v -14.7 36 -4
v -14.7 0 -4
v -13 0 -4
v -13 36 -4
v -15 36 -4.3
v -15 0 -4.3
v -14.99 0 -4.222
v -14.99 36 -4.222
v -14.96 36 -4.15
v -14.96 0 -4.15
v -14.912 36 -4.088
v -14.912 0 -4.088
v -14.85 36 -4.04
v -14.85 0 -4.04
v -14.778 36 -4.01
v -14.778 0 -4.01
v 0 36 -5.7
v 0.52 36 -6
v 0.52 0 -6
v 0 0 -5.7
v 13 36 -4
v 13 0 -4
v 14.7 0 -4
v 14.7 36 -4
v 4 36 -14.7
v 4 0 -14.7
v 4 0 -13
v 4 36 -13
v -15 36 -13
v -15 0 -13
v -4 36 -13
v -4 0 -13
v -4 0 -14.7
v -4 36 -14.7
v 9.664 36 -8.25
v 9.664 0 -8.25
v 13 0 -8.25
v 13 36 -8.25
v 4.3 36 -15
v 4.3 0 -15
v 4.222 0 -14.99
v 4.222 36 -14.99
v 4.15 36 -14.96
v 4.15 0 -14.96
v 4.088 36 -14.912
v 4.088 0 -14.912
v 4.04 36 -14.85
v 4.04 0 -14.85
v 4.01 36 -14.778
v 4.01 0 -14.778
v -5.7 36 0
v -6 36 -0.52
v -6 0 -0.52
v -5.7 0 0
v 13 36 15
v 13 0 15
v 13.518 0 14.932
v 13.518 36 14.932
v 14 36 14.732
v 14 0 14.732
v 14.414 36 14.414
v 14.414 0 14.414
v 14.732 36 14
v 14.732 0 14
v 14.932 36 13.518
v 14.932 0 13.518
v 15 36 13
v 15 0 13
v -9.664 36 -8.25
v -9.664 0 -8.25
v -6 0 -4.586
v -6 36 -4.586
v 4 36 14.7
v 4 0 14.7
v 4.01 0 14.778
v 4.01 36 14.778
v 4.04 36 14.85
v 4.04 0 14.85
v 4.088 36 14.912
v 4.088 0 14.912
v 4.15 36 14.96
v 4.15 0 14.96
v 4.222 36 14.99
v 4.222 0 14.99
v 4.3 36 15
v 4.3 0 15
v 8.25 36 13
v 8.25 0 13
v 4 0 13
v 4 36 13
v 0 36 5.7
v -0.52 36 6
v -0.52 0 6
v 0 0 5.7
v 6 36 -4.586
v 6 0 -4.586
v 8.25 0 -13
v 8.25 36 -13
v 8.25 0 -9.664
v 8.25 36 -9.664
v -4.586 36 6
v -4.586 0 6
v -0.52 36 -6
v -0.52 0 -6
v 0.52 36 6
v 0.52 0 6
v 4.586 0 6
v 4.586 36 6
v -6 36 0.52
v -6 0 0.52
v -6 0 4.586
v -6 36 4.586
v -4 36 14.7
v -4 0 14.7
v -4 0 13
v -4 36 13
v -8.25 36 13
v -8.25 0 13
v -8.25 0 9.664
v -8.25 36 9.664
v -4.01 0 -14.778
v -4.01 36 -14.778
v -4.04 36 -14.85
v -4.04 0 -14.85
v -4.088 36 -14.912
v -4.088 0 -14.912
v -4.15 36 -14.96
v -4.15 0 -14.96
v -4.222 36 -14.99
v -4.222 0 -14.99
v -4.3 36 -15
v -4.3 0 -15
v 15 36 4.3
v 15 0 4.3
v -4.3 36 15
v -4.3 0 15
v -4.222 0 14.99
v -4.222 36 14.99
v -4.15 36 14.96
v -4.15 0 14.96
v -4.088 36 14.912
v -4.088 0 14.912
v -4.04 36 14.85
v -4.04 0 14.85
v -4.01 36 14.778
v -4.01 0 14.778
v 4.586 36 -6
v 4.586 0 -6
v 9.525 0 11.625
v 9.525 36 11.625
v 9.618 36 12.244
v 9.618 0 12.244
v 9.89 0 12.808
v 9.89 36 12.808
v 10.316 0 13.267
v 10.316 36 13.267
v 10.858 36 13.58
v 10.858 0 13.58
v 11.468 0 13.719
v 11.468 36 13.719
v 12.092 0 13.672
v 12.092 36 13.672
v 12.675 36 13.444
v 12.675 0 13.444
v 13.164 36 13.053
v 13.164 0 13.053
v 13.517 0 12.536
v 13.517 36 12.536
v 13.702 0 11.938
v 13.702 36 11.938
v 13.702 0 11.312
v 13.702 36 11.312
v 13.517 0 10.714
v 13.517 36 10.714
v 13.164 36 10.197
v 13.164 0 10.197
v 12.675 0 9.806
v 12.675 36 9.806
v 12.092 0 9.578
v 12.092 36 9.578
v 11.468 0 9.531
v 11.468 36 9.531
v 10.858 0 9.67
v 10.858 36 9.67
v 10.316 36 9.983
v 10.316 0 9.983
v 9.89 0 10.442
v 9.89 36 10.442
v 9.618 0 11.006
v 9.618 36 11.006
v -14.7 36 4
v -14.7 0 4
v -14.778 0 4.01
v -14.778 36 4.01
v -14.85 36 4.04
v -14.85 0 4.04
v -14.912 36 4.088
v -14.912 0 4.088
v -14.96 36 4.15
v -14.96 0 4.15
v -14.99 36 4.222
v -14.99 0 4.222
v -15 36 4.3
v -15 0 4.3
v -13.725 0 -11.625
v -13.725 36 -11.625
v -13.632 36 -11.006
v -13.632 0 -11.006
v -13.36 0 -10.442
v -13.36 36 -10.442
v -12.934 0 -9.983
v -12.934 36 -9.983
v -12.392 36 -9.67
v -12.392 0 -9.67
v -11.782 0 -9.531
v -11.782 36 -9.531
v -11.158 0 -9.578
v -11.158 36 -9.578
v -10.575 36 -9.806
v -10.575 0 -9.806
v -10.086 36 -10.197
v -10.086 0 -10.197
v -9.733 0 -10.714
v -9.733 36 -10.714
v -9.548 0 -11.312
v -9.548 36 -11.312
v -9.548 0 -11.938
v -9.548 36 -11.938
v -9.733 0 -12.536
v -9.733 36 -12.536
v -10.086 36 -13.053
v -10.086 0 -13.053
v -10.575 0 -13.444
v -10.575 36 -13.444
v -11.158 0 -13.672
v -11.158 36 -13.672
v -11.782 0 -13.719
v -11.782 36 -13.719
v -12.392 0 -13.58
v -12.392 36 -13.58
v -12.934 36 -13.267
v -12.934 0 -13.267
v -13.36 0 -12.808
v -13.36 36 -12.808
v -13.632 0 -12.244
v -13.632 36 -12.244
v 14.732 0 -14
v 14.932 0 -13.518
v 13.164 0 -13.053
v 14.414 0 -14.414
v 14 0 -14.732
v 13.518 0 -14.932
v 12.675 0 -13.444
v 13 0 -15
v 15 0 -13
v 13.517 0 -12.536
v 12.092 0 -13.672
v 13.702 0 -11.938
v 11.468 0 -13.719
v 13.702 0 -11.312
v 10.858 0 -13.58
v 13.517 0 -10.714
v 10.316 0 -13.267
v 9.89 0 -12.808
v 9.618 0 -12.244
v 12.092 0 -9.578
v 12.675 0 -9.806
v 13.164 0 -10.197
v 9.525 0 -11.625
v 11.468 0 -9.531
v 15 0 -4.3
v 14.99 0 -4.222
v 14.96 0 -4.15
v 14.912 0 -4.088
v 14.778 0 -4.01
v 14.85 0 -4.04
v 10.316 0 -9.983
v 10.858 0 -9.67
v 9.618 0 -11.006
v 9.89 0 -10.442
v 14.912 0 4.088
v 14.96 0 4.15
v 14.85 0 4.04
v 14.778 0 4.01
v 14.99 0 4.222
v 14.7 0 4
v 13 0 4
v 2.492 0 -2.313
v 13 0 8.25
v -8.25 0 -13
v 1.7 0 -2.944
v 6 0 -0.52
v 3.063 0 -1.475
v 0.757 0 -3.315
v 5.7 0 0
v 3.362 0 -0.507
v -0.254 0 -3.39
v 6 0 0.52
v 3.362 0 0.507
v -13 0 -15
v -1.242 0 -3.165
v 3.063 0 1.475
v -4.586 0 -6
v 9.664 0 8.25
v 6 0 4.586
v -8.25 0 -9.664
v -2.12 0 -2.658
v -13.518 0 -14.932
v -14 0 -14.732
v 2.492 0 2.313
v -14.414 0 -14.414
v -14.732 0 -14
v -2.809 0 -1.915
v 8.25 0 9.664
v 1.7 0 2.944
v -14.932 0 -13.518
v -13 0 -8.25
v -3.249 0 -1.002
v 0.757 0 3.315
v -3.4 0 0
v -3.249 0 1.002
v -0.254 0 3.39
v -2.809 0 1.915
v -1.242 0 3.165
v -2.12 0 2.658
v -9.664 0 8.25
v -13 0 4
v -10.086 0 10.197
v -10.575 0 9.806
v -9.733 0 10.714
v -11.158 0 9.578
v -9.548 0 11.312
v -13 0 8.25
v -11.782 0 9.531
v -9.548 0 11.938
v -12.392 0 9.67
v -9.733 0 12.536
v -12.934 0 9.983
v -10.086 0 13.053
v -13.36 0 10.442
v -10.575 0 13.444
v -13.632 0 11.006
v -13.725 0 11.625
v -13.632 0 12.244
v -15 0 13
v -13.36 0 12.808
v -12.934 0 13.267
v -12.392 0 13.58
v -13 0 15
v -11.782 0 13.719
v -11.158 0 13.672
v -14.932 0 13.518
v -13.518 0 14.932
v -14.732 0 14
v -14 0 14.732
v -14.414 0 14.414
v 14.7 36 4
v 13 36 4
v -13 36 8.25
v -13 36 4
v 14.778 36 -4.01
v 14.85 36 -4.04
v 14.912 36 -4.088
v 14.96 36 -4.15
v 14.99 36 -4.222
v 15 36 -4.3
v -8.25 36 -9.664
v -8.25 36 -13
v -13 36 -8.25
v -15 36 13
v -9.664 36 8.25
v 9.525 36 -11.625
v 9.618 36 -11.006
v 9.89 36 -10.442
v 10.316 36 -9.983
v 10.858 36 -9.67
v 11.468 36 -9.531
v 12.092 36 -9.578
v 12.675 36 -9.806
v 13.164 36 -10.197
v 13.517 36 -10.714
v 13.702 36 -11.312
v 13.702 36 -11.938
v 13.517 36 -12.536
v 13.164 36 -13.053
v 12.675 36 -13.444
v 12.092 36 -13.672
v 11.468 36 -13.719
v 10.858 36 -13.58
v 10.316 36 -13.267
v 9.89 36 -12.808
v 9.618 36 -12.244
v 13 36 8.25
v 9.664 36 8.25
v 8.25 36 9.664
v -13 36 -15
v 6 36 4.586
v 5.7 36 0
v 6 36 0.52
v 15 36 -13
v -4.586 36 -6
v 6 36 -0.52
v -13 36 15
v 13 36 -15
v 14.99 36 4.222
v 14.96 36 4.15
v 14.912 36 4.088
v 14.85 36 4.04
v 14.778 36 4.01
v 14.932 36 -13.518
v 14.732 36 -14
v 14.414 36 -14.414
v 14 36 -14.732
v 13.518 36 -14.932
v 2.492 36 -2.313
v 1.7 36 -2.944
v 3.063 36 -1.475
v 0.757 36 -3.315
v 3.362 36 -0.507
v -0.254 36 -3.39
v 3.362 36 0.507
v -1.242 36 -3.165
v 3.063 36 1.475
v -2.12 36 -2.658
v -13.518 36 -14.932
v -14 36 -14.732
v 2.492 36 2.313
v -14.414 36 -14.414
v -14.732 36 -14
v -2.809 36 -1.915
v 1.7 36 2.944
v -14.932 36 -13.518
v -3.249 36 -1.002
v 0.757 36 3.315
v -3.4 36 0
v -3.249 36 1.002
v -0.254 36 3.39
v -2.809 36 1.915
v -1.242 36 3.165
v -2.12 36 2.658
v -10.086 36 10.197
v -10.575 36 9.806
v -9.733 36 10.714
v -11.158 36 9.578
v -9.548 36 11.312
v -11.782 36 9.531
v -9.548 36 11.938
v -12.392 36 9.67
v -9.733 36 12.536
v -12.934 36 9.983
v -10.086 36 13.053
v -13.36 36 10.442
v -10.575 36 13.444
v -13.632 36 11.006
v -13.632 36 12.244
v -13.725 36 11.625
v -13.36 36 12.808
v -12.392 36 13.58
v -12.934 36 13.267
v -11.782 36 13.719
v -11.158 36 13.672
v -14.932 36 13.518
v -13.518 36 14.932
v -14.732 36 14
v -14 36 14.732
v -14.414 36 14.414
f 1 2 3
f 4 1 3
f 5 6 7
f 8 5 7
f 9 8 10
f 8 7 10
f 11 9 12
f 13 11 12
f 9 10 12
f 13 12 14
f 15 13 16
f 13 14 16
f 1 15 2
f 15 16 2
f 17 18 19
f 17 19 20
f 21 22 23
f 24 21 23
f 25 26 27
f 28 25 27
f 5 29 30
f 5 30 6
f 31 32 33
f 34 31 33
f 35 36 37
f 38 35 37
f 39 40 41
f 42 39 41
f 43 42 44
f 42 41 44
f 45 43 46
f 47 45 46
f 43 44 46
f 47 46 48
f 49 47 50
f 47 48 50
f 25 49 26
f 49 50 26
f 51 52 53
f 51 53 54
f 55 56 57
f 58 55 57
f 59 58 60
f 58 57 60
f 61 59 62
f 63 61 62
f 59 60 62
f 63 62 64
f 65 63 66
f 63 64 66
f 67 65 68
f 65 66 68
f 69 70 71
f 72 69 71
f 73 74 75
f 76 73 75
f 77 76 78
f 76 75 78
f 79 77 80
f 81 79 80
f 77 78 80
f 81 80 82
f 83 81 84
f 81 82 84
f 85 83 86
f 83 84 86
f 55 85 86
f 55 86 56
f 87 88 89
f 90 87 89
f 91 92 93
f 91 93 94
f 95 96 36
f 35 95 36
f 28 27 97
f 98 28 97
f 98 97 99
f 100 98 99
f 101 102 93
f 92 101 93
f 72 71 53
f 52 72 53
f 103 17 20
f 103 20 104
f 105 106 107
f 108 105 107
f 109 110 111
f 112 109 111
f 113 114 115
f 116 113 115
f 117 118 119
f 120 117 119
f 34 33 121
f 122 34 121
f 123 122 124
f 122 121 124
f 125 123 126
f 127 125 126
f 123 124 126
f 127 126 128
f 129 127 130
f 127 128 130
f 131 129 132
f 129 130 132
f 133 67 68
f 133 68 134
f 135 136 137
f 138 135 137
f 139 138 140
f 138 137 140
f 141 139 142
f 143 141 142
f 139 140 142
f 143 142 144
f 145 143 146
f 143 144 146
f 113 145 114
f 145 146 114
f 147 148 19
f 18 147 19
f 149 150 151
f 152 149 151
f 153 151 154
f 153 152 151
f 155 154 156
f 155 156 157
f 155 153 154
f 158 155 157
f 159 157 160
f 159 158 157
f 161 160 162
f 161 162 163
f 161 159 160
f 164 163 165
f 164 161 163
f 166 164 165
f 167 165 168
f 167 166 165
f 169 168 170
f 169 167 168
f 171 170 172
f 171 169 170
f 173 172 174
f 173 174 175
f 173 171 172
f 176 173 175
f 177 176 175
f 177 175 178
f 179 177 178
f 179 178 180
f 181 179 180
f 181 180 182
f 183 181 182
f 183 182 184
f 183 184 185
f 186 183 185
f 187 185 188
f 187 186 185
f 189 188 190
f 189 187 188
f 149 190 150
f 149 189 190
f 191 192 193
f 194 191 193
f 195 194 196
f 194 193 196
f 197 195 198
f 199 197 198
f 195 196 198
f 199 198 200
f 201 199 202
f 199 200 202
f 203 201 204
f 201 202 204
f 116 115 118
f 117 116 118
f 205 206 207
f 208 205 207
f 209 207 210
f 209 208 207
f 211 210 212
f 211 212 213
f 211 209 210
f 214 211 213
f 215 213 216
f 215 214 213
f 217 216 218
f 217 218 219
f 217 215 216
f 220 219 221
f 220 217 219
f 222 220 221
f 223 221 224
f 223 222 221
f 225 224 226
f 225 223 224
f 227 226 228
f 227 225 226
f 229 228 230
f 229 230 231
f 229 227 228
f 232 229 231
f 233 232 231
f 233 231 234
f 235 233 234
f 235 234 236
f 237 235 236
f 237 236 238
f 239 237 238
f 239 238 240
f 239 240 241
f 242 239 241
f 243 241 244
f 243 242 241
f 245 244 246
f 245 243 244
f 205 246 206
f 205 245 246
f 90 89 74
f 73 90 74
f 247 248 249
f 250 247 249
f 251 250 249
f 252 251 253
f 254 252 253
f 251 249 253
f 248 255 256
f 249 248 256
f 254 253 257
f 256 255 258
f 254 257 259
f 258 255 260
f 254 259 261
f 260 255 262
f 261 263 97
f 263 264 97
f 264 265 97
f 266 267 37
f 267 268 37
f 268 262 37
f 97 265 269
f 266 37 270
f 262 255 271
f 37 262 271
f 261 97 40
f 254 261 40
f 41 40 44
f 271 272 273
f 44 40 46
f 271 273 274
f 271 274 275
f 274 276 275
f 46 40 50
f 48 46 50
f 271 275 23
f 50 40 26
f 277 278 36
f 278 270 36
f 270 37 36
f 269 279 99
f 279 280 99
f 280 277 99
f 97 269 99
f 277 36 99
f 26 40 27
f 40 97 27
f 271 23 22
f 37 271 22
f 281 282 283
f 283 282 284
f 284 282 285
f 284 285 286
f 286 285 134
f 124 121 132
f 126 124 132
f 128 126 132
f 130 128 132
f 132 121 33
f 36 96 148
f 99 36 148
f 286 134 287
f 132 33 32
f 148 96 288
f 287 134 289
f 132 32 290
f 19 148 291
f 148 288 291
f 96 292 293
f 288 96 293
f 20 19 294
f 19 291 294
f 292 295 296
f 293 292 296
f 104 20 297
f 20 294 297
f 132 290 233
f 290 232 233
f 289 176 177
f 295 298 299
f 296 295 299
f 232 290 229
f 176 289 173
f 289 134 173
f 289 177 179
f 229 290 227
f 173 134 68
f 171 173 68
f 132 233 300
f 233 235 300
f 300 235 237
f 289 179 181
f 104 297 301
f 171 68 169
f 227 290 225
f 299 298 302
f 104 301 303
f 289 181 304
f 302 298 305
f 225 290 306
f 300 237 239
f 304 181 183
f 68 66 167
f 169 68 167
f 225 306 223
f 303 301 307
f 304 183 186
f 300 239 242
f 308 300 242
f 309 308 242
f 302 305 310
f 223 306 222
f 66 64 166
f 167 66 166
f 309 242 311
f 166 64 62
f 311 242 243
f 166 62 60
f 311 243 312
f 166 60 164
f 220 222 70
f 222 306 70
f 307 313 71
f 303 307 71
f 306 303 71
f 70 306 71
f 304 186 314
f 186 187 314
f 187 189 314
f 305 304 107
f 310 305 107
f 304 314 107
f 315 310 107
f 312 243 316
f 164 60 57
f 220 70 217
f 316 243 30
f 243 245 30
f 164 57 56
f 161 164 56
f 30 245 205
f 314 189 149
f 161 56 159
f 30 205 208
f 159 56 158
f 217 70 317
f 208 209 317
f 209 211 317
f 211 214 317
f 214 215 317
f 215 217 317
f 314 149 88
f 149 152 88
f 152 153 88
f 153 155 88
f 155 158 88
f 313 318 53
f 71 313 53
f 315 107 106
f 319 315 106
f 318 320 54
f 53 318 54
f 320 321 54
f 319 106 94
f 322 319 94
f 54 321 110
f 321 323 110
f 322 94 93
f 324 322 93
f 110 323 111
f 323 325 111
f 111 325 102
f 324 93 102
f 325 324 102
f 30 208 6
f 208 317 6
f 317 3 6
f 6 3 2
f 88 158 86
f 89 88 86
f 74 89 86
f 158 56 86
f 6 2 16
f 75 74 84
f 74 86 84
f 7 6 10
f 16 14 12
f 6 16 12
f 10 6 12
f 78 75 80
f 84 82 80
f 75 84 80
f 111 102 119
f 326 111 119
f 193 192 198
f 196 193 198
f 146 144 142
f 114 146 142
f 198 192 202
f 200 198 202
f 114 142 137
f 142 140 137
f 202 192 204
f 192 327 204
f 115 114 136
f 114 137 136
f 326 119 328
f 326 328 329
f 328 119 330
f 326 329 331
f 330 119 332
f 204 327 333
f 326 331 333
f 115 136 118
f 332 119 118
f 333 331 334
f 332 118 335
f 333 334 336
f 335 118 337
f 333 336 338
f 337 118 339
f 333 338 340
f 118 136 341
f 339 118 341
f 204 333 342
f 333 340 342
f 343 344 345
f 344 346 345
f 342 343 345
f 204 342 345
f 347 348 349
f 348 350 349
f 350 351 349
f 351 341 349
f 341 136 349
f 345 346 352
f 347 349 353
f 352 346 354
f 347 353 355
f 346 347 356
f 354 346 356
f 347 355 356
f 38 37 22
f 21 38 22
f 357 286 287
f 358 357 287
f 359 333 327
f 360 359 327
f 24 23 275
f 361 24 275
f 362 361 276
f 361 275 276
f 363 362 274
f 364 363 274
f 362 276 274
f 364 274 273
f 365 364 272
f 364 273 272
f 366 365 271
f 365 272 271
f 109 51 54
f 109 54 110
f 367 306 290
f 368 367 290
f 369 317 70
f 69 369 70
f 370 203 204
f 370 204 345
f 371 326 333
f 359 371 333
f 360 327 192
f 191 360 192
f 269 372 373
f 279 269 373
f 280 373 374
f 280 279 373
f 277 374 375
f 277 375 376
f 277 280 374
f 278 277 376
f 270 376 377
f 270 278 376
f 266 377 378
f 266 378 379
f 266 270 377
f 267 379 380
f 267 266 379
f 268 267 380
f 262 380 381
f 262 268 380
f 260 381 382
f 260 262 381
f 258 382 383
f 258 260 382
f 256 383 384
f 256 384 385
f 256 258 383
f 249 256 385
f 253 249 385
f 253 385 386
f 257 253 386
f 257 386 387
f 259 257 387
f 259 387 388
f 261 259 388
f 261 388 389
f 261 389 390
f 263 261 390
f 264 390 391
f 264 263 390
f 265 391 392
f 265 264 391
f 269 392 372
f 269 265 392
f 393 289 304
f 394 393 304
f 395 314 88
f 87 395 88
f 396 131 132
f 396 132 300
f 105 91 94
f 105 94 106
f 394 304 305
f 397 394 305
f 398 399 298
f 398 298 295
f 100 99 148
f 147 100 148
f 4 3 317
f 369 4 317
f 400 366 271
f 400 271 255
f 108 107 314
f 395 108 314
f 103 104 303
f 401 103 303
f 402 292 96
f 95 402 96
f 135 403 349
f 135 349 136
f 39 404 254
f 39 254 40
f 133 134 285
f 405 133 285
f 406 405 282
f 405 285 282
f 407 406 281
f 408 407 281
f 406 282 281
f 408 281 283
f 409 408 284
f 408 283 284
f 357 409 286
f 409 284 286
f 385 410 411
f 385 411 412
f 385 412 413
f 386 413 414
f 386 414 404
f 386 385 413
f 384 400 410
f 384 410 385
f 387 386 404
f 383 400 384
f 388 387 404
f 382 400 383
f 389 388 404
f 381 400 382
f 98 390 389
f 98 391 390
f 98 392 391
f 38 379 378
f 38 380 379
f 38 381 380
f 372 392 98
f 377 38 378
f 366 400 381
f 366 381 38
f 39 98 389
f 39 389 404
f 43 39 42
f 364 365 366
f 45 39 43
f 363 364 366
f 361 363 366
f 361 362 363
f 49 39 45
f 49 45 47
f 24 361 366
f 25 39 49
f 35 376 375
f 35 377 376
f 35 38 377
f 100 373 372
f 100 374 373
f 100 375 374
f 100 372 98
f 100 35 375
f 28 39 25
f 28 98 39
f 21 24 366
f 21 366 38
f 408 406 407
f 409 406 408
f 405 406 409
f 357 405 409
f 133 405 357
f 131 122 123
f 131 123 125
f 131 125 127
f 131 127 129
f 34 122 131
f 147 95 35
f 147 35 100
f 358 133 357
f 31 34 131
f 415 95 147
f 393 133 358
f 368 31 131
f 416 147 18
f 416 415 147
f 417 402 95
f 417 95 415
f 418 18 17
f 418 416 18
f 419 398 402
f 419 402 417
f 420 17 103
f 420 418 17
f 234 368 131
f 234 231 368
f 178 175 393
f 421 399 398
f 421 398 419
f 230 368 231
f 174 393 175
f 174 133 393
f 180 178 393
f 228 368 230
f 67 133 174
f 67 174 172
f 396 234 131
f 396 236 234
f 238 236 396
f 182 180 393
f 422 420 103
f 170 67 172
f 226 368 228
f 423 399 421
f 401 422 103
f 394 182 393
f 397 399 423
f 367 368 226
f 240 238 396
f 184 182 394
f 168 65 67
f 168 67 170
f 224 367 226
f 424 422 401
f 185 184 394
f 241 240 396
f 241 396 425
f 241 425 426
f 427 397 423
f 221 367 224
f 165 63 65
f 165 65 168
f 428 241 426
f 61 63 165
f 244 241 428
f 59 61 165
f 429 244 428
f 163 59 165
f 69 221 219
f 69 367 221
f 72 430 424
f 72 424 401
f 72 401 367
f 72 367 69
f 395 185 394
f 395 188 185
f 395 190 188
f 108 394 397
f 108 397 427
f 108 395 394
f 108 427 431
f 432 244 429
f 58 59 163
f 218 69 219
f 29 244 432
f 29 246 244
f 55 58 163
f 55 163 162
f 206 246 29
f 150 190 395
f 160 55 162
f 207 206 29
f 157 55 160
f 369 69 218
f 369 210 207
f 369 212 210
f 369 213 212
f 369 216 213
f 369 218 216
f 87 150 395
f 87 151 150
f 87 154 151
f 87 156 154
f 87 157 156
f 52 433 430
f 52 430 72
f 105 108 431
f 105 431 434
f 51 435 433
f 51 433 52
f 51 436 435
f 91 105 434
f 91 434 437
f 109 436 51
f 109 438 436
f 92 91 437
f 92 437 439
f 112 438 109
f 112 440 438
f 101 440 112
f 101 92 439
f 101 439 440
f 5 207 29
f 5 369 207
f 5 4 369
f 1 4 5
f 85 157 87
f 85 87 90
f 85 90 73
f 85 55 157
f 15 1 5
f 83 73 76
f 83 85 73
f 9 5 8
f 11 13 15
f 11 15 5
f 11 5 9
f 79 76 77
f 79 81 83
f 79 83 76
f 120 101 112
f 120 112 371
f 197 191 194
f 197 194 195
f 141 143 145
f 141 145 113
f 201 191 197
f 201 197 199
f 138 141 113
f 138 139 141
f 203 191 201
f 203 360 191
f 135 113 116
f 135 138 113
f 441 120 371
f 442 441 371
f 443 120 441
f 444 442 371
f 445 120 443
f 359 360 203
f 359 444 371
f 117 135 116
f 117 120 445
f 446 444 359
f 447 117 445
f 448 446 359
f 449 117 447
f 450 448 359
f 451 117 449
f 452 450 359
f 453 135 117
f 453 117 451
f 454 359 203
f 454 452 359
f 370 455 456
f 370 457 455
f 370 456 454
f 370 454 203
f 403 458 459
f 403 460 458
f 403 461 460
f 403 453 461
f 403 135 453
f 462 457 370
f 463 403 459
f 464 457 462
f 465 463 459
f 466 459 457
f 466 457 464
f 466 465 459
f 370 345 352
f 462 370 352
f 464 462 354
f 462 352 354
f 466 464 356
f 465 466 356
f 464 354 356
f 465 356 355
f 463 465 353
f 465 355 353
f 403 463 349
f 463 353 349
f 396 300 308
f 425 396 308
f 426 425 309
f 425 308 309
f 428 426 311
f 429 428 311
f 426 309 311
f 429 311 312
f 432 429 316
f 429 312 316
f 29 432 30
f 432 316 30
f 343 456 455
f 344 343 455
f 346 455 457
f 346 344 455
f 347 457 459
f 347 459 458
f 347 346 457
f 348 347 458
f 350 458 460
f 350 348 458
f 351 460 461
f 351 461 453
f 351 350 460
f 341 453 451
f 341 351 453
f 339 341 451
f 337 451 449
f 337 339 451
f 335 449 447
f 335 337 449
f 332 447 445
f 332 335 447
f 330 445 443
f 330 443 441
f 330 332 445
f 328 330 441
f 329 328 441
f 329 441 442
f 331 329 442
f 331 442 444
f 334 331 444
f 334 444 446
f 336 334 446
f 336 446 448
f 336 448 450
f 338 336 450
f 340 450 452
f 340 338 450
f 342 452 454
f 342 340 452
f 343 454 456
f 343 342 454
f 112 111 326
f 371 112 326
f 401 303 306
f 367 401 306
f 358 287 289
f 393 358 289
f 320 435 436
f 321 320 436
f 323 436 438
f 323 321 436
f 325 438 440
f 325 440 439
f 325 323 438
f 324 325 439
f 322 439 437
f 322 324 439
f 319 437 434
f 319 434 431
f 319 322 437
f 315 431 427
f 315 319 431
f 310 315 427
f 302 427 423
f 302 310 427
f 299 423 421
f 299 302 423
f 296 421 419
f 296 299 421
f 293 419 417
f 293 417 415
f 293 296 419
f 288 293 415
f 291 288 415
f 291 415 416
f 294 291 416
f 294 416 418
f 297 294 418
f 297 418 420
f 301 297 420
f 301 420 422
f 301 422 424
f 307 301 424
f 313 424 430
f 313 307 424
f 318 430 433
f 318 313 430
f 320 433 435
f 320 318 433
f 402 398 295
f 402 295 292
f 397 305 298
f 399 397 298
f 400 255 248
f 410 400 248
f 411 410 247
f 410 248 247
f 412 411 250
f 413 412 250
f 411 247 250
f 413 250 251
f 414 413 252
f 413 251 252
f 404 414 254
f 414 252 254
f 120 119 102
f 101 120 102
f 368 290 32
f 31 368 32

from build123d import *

# Parameters (mm, degrees)
MODEL_R                  = 2.1
MODEL_R_2                = 3.4
STRUCTURAL_MEMBER1_DEPTH = 36


with BuildPart() as part:
    # Model → Structural Member1 (new body)
    with BuildSketch(Plane(origin=(0, 0, 0), x_dir=(-1, 0, 0), z_dir=(0, 1, 0))):
        with BuildLine():
            Line((-15, 13), (-15, 4.3))
            ThreePointArc((-15, 4.3), (-14.912132034, 4.087867966), (-14.7, 4))
            Line((-14.7, 4), (-13, 4))
            Line((-13, 4), (-13, 8.25))
            Line((-13, 8.25), (-9.6642, 8.25))
            Line((-9.6642, 8.25), (-6, 4.5858))
            Line((-6, 4.5858), (-6, 0.519615242))
            Line((-6, 0.519615242), (-5.7, 0))
            Line((-5.7, 0), (-6, -0.519615242))
            Line((-6, -0.519615242), (-6, -4.5858))
            Line((-6, -4.5858), (-9.6642, -8.25))
            Line((-9.6642, -8.25), (-13, -8.25))
            Line((-13, -8.25), (-13, -4))
            Line((-13, -4), (-14.7, -4))
            ThreePointArc((-14.7, -4), (-14.912132034, -4.087867966), (-15, -4.3))
            Line((-15, -4.3), (-15, -13))
            ThreePointArc((-15, -13), (-14.414213562, -14.414213562), (-13, -15))
            Line((-13, -15), (-4.3, -15))
            ThreePointArc((-4.3, -15), (-4.087867966, -14.912132034), (-4, -14.7))
            Line((-4, -14.7), (-4, -13))
            Line((-4, -13), (-8.25, -13))
            Line((-8.25, -13), (-8.25, -9.6642))
            Line((-8.25, -9.6642), (-4.5858, -6))
            Line((-4.5858, -6), (-0.519615242, -6))
            Line((-0.519615242, -6), (0, -5.7))
            Line((0, -5.7), (0.519615242, -6))
            Line((0.519615242, -6), (4.5858, -6))
            Line((4.5858, -6), (8.25, -9.6642))
            Line((8.25, -9.6642), (8.25, -13))
            Line((8.25, -13), (4, -13))
            Line((4, -13), (4, -14.7))
            ThreePointArc((4, -14.7), (4.087867966, -14.912132034), (4.3, -15))
            Line((4.3, -15), (13, -15))
            ThreePointArc((13, -15), (14.414213562, -14.414213562), (15, -13))
            Line((15, -13), (15, -4.3))
            ThreePointArc((15, -4.3), (14.912132034, -4.087867966), (14.7, -4))
            Line((14.7, -4), (13, -4))
            Line((13, -4), (13, -8.25))
            Line((13, -8.25), (9.6642, -8.25))
            Line((9.6642, -8.25), (6, -4.5858))
            Line((6, -4.5858), (6, -0.519615242))
            Line((6, -0.519615242), (5.7, 0))
            Line((5.7, 0), (6, 0.519615242))
            Line((6, 0.519615242), (6, 4.5858))
            Line((6, 4.5858), (9.6642, 8.25))
            Line((9.6642, 8.25), (13, 8.25))
            Line((13, 8.25), (13, 4))
            Line((13, 4), (14.7, 4))
            ThreePointArc((14.7, 4), (14.912132034, 4.087867966), (15, 4.3))
            Line((15, 4.3), (15, 13))
            ThreePointArc((15, 13), (14.414213562, 14.414213562), (13, 15))
            Line((13, 15), (4.3, 15))
            ThreePointArc((4.3, 15), (4.087867966, 14.912132034), (4, 14.7))
            Line((4, 14.7), (4, 13))
            Line((4, 13), (8.25, 13))
            Line((8.25, 13), (8.25, 9.6642))
            Line((8.25, 9.6642), (4.5858, 6))
            Line((4.5858, 6), (0.519615242, 6))
            Line((0.519615242, 6), (0, 5.7))
            Line((0, 5.7), (-0.519615242, 6))
            Line((-0.519615242, 6), (-4.5858, 6))
            Line((-4.5858, 6), (-8.25, 9.6642))
            Line((-8.25, 9.6642), (-8.25, 13))
            Line((-8.25, 13), (-4, 13))
            Line((-4, 13), (-4, 14.7))
            ThreePointArc((-4, 14.7), (-4.087867966, 14.912132034), (-4.3, 15))
            Line((-4.3, 15), (-13, 15))
            ThreePointArc((-13, 15), (-14.414213562, 14.414213562), (-15, 13))
        make_face()
        with Locations((11.625, -11.625)):
            Circle(MODEL_R, mode=Mode.SUBTRACT)
        with Locations((11.625, 11.625)):
            Circle(MODEL_R, mode=Mode.SUBTRACT)
        Circle(MODEL_R_2, mode=Mode.SUBTRACT)
        with Locations((-11.625, -11.625)):
            Circle(MODEL_R, mode=Mode.SUBTRACT)
        with Locations((-11.625, 11.625)):
            Circle(MODEL_R, mode=Mode.SUBTRACT)
    extrude(amount=STRUCTURAL_MEMBER1_DEPTH)


solid = part.part
